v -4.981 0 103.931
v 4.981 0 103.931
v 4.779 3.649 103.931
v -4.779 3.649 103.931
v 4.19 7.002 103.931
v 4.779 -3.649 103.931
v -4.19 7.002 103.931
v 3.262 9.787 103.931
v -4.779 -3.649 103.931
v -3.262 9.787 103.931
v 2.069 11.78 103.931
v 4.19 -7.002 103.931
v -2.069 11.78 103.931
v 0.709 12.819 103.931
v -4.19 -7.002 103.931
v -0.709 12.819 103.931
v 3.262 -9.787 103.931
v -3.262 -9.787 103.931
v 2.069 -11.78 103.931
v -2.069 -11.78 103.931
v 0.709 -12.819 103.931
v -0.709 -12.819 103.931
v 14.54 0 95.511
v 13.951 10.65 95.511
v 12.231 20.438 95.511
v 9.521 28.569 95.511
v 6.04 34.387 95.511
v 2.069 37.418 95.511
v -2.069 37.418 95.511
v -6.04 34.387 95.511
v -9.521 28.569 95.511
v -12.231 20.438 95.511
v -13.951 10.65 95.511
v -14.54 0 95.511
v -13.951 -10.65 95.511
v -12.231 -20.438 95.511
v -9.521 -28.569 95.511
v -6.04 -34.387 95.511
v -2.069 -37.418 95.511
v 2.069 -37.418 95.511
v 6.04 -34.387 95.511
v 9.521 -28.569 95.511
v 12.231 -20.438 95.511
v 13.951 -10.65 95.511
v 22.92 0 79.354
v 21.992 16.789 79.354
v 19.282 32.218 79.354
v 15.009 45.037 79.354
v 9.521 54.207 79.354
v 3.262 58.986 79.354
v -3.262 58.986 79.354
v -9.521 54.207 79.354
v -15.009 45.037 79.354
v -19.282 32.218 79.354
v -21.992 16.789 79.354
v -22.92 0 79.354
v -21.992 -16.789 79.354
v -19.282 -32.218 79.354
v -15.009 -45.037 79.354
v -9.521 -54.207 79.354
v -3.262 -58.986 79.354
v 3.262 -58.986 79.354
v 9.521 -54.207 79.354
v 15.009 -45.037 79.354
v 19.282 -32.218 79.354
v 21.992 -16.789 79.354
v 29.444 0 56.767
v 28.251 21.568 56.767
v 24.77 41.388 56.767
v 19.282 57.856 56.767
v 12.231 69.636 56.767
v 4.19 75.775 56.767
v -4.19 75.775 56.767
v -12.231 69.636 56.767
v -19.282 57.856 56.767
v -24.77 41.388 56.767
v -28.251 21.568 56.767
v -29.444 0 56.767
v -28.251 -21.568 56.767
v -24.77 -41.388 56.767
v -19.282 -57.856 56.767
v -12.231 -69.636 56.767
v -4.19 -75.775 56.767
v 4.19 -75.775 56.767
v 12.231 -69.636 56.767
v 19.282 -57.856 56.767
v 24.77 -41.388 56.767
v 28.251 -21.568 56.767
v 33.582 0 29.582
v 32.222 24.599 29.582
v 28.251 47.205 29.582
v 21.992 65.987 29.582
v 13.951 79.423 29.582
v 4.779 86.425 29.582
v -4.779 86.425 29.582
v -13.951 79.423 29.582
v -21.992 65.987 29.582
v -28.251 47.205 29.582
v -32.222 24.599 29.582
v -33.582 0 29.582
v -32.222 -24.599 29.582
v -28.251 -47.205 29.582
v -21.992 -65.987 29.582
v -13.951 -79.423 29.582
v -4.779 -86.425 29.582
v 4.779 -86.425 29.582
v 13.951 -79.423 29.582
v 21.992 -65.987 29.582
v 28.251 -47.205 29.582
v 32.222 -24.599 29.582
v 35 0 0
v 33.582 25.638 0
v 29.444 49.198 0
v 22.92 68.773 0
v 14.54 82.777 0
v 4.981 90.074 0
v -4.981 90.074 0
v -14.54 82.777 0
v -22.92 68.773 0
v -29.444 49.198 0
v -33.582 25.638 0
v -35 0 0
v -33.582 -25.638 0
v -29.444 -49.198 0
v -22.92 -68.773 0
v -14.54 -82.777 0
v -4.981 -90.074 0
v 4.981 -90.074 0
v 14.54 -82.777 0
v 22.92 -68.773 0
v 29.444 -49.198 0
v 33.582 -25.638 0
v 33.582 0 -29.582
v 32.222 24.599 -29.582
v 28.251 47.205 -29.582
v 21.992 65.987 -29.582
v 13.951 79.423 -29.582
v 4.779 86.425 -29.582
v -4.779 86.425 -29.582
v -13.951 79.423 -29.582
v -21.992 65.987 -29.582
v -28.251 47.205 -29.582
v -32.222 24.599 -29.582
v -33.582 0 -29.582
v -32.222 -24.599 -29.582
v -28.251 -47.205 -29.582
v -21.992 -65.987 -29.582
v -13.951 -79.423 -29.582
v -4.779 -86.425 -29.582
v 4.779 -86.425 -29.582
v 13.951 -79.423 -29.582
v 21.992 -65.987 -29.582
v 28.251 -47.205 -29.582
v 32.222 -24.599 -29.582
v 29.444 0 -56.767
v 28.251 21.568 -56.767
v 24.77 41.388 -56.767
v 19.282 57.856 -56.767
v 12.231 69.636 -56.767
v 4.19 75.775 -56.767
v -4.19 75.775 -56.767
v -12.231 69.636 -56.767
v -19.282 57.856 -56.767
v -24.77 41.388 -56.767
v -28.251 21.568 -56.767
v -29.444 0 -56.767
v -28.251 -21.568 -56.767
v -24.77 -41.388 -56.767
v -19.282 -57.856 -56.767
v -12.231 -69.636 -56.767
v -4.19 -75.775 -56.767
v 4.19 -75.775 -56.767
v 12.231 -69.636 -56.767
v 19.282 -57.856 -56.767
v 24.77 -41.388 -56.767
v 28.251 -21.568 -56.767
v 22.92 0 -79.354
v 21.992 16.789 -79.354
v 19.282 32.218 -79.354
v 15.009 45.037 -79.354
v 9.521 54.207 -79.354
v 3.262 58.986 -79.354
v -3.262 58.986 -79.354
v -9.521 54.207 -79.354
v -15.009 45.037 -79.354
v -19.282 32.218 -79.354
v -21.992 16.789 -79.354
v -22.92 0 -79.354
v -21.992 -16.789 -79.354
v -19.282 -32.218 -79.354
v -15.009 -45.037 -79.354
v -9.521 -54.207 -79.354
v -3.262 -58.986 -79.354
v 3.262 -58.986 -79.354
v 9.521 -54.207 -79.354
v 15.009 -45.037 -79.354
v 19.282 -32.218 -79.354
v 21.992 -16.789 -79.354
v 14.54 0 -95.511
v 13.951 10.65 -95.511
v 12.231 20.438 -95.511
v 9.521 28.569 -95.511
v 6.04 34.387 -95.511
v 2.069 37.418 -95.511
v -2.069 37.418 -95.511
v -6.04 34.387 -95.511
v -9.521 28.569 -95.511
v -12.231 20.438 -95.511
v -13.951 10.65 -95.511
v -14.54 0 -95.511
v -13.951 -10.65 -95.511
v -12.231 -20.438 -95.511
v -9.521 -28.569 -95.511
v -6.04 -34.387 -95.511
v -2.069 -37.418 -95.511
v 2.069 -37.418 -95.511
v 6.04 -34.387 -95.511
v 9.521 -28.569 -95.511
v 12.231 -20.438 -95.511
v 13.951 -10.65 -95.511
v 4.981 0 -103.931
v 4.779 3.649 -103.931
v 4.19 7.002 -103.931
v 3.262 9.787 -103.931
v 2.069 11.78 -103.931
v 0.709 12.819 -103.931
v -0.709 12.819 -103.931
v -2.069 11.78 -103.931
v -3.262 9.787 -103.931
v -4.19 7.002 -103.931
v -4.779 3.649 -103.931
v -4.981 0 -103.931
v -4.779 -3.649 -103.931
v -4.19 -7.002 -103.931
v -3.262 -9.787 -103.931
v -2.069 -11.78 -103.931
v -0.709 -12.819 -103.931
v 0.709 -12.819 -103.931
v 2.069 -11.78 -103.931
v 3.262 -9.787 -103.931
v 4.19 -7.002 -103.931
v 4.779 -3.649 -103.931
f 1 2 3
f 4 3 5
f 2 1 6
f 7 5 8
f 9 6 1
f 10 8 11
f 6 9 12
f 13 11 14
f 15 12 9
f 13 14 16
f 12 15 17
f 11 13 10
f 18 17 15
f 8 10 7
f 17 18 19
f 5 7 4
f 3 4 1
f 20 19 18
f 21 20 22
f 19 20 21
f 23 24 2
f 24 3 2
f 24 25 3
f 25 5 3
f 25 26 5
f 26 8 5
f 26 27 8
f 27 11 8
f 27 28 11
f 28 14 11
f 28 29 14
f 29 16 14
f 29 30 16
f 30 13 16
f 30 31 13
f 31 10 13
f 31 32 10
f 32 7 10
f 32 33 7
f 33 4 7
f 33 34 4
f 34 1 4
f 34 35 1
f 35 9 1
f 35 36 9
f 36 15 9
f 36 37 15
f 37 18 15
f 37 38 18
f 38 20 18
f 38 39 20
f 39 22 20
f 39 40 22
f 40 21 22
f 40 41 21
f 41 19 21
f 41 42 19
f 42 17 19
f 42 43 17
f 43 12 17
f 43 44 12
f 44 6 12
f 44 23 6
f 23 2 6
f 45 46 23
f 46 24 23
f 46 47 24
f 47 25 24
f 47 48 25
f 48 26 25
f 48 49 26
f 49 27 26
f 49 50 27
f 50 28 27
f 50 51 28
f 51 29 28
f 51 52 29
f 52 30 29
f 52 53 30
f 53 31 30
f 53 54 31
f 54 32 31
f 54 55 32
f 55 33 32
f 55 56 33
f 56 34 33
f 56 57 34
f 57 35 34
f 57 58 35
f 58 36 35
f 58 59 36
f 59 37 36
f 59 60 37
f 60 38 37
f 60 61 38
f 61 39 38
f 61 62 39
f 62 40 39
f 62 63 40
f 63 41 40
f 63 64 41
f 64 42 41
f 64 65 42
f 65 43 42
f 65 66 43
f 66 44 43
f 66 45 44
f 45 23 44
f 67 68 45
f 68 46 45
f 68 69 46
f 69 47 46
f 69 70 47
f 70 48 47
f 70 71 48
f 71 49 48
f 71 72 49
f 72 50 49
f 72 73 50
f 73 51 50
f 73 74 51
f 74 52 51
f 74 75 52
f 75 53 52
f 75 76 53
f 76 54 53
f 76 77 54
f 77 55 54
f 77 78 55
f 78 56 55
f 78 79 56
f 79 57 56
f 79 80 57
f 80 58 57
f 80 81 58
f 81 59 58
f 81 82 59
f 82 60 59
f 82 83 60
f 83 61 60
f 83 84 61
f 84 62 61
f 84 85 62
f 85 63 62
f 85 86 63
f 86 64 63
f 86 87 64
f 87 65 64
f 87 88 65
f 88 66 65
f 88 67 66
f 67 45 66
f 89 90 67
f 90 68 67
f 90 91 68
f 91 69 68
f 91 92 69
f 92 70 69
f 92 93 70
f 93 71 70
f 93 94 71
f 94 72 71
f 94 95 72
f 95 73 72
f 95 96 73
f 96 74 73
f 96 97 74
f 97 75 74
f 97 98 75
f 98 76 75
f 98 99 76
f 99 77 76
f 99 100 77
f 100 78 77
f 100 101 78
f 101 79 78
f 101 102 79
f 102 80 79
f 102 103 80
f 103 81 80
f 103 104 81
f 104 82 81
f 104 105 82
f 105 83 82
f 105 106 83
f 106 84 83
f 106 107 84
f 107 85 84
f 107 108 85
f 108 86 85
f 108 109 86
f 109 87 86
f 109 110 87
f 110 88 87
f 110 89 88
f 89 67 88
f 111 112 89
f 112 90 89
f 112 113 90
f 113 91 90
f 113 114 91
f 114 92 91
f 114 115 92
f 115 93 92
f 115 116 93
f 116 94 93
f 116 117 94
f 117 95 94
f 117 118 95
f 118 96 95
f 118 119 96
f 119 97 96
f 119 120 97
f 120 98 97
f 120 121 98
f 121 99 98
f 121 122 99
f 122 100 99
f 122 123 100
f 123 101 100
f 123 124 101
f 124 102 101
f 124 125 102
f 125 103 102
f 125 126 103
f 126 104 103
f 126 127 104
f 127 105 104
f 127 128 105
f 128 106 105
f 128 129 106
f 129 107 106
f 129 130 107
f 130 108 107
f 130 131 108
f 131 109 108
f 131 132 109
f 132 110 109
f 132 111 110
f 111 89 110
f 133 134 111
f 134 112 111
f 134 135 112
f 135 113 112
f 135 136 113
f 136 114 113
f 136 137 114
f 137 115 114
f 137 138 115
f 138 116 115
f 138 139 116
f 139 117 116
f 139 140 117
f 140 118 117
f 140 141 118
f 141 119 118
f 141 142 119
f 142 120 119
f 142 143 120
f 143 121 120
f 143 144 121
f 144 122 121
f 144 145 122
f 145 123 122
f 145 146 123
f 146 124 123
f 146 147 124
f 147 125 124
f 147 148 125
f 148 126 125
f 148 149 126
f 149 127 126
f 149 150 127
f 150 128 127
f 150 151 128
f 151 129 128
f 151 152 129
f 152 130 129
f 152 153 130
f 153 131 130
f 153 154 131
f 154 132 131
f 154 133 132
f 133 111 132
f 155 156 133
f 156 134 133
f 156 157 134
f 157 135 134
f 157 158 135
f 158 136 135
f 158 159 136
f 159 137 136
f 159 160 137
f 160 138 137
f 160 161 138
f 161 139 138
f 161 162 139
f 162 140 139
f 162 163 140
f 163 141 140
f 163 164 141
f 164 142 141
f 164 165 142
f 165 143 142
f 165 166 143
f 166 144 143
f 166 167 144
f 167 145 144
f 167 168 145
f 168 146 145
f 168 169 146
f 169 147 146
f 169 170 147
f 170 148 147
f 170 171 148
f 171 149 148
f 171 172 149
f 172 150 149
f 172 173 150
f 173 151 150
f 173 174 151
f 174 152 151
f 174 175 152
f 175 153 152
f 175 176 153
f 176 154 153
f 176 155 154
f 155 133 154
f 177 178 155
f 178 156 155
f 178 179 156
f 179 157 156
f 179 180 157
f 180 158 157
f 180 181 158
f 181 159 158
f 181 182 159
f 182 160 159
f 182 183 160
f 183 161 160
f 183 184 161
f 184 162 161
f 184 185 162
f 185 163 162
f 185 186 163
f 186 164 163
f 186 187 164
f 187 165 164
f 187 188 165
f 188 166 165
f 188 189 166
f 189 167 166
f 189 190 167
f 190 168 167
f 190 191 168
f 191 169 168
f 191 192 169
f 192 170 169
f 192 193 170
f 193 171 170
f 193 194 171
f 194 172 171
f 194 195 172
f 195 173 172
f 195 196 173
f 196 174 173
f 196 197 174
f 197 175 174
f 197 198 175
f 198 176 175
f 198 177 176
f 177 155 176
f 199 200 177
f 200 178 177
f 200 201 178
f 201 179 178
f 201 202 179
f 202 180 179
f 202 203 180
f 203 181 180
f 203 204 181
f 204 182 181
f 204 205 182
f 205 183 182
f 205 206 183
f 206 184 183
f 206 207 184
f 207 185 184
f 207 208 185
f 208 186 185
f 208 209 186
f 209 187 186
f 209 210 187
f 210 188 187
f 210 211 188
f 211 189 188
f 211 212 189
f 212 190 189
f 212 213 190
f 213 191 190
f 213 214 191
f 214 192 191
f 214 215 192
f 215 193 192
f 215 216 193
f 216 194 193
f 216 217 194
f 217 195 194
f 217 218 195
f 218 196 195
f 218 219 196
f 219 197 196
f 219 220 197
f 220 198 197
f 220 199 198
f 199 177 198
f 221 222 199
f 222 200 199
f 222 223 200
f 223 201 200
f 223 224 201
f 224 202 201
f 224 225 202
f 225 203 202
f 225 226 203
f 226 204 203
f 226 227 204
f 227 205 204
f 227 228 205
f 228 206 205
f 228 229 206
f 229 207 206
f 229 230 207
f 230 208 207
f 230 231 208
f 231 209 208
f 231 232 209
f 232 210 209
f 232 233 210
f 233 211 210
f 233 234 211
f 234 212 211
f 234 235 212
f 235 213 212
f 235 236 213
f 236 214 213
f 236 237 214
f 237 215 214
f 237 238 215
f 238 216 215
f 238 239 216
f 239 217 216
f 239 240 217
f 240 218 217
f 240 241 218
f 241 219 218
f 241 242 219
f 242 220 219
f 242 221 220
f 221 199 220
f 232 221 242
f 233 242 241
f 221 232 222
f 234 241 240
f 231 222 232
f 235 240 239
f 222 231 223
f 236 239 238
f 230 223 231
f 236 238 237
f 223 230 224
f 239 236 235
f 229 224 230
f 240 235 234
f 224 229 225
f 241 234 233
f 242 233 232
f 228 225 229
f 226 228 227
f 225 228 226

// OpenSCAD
// Generated by SolidPython 1.0.1 on 2020-07-29 00:46:46


scale(v = [5, 13, 15]) {
	sphere(r = 7);
}
/***********************************************
*********      SolidPython code:      **********
************************************************
 
# import packages: SolidPython
from solid import *
from solid.utils import *
from itertools import chain, combinations, permutations


class Resize:

    def __init__(self, scad_file):
        self.scad_file = scad_file
        #self.scad_file = import_scad(scad_file)
        # cone/cylinder param:
        self.r1 = 0
        self.r2 = 0
        self.h = 0
        # rectangular prism param:
        self.w = 0
        self.l = 0
        # ellipse param:
        self.r = 0

    # import OpenScad code (file name corresponds to shape)


    # classify shape + parameters
    def assign(self, param1, param2, param3):
        if self.scad_file == 'cone.scad':
            self.r1 = param1
            self.r2 = param2
            self.h = param3
        elif self.scad_file == 'cylinder.scad':
            self.r1 = param1
            self.r2 = param2
            self.h = param3
        elif self.scad_file == 'rectangularPrism.scad':
            self.h = param1
            self.l = param2
            self.w = param3
        else:
            self.r = param1
            self.h = param2

    # resize parameters
    def iterate(self):
        x = range(3, 20, 2)
        i = 1
        if self.scad_file == 'cone.scad':
            tempList = list(permutations(x, 2))
            for temp in tempList:
                param1 = temp[0]
                param2 = temp[1]
                filepath = 'produced_scad_files/' + 'cone' + str(param1) + '_' + str(param2) + '_' + '.scad'
                scad_render_to_file(cylinder(h=param1, r1=param2, r2=0), filepath)

        elif self.scad_file == 'cylinder.scad':
            tempList = list(permutations(x, 3))
            for temp in tempList:
                param1 = temp[0]
                param2 = temp[1]
                filepath = 'produced_scad_files/' + 'cylinder' + str(param1) + '_' + str(param2) + '_' + '.scad'
                scad_render_to_file(cylinder(h=param1, r1=param2, r2=param2), filepath)

        elif self.scad_file == 'rectangularPrism.scad':
            tempList = list(permutations(x, 3))
            for temp in tempList:
                param1 = temp[0]
                param2 = temp[1]
                param3 = temp[2]
                filepath = 'produced_scad_files/' + 'rectangularPrism' + str(param1) + '_' + str(param2) + '_' + str(
                    param3) + '.scad'
                scad_render_to_file(cube(size=(param1, param2, param3)), filepath)

        elif self.scad_file == 'ellipse.scad':
            tempList = list(permutations(x, 4))
            for temp in tempList:
                param1 = temp[0]
                param2 = temp[1]
                param3 = temp[2]
                param4 = temp[3]
                filepath = 'produced_scad_files/' + 'ellipse' + str(param1) + '_' + str(param2) + '_' + str(param3) + '_' + str(param4) + '.scad'
                scad_render_to_file(scale([param1, param2, param3])(sphere(r=param4)), filepath)

    def render_to_scadfile(self):
        scad_render_to_file(scad, 'example.scad') 
 
************************************************/
